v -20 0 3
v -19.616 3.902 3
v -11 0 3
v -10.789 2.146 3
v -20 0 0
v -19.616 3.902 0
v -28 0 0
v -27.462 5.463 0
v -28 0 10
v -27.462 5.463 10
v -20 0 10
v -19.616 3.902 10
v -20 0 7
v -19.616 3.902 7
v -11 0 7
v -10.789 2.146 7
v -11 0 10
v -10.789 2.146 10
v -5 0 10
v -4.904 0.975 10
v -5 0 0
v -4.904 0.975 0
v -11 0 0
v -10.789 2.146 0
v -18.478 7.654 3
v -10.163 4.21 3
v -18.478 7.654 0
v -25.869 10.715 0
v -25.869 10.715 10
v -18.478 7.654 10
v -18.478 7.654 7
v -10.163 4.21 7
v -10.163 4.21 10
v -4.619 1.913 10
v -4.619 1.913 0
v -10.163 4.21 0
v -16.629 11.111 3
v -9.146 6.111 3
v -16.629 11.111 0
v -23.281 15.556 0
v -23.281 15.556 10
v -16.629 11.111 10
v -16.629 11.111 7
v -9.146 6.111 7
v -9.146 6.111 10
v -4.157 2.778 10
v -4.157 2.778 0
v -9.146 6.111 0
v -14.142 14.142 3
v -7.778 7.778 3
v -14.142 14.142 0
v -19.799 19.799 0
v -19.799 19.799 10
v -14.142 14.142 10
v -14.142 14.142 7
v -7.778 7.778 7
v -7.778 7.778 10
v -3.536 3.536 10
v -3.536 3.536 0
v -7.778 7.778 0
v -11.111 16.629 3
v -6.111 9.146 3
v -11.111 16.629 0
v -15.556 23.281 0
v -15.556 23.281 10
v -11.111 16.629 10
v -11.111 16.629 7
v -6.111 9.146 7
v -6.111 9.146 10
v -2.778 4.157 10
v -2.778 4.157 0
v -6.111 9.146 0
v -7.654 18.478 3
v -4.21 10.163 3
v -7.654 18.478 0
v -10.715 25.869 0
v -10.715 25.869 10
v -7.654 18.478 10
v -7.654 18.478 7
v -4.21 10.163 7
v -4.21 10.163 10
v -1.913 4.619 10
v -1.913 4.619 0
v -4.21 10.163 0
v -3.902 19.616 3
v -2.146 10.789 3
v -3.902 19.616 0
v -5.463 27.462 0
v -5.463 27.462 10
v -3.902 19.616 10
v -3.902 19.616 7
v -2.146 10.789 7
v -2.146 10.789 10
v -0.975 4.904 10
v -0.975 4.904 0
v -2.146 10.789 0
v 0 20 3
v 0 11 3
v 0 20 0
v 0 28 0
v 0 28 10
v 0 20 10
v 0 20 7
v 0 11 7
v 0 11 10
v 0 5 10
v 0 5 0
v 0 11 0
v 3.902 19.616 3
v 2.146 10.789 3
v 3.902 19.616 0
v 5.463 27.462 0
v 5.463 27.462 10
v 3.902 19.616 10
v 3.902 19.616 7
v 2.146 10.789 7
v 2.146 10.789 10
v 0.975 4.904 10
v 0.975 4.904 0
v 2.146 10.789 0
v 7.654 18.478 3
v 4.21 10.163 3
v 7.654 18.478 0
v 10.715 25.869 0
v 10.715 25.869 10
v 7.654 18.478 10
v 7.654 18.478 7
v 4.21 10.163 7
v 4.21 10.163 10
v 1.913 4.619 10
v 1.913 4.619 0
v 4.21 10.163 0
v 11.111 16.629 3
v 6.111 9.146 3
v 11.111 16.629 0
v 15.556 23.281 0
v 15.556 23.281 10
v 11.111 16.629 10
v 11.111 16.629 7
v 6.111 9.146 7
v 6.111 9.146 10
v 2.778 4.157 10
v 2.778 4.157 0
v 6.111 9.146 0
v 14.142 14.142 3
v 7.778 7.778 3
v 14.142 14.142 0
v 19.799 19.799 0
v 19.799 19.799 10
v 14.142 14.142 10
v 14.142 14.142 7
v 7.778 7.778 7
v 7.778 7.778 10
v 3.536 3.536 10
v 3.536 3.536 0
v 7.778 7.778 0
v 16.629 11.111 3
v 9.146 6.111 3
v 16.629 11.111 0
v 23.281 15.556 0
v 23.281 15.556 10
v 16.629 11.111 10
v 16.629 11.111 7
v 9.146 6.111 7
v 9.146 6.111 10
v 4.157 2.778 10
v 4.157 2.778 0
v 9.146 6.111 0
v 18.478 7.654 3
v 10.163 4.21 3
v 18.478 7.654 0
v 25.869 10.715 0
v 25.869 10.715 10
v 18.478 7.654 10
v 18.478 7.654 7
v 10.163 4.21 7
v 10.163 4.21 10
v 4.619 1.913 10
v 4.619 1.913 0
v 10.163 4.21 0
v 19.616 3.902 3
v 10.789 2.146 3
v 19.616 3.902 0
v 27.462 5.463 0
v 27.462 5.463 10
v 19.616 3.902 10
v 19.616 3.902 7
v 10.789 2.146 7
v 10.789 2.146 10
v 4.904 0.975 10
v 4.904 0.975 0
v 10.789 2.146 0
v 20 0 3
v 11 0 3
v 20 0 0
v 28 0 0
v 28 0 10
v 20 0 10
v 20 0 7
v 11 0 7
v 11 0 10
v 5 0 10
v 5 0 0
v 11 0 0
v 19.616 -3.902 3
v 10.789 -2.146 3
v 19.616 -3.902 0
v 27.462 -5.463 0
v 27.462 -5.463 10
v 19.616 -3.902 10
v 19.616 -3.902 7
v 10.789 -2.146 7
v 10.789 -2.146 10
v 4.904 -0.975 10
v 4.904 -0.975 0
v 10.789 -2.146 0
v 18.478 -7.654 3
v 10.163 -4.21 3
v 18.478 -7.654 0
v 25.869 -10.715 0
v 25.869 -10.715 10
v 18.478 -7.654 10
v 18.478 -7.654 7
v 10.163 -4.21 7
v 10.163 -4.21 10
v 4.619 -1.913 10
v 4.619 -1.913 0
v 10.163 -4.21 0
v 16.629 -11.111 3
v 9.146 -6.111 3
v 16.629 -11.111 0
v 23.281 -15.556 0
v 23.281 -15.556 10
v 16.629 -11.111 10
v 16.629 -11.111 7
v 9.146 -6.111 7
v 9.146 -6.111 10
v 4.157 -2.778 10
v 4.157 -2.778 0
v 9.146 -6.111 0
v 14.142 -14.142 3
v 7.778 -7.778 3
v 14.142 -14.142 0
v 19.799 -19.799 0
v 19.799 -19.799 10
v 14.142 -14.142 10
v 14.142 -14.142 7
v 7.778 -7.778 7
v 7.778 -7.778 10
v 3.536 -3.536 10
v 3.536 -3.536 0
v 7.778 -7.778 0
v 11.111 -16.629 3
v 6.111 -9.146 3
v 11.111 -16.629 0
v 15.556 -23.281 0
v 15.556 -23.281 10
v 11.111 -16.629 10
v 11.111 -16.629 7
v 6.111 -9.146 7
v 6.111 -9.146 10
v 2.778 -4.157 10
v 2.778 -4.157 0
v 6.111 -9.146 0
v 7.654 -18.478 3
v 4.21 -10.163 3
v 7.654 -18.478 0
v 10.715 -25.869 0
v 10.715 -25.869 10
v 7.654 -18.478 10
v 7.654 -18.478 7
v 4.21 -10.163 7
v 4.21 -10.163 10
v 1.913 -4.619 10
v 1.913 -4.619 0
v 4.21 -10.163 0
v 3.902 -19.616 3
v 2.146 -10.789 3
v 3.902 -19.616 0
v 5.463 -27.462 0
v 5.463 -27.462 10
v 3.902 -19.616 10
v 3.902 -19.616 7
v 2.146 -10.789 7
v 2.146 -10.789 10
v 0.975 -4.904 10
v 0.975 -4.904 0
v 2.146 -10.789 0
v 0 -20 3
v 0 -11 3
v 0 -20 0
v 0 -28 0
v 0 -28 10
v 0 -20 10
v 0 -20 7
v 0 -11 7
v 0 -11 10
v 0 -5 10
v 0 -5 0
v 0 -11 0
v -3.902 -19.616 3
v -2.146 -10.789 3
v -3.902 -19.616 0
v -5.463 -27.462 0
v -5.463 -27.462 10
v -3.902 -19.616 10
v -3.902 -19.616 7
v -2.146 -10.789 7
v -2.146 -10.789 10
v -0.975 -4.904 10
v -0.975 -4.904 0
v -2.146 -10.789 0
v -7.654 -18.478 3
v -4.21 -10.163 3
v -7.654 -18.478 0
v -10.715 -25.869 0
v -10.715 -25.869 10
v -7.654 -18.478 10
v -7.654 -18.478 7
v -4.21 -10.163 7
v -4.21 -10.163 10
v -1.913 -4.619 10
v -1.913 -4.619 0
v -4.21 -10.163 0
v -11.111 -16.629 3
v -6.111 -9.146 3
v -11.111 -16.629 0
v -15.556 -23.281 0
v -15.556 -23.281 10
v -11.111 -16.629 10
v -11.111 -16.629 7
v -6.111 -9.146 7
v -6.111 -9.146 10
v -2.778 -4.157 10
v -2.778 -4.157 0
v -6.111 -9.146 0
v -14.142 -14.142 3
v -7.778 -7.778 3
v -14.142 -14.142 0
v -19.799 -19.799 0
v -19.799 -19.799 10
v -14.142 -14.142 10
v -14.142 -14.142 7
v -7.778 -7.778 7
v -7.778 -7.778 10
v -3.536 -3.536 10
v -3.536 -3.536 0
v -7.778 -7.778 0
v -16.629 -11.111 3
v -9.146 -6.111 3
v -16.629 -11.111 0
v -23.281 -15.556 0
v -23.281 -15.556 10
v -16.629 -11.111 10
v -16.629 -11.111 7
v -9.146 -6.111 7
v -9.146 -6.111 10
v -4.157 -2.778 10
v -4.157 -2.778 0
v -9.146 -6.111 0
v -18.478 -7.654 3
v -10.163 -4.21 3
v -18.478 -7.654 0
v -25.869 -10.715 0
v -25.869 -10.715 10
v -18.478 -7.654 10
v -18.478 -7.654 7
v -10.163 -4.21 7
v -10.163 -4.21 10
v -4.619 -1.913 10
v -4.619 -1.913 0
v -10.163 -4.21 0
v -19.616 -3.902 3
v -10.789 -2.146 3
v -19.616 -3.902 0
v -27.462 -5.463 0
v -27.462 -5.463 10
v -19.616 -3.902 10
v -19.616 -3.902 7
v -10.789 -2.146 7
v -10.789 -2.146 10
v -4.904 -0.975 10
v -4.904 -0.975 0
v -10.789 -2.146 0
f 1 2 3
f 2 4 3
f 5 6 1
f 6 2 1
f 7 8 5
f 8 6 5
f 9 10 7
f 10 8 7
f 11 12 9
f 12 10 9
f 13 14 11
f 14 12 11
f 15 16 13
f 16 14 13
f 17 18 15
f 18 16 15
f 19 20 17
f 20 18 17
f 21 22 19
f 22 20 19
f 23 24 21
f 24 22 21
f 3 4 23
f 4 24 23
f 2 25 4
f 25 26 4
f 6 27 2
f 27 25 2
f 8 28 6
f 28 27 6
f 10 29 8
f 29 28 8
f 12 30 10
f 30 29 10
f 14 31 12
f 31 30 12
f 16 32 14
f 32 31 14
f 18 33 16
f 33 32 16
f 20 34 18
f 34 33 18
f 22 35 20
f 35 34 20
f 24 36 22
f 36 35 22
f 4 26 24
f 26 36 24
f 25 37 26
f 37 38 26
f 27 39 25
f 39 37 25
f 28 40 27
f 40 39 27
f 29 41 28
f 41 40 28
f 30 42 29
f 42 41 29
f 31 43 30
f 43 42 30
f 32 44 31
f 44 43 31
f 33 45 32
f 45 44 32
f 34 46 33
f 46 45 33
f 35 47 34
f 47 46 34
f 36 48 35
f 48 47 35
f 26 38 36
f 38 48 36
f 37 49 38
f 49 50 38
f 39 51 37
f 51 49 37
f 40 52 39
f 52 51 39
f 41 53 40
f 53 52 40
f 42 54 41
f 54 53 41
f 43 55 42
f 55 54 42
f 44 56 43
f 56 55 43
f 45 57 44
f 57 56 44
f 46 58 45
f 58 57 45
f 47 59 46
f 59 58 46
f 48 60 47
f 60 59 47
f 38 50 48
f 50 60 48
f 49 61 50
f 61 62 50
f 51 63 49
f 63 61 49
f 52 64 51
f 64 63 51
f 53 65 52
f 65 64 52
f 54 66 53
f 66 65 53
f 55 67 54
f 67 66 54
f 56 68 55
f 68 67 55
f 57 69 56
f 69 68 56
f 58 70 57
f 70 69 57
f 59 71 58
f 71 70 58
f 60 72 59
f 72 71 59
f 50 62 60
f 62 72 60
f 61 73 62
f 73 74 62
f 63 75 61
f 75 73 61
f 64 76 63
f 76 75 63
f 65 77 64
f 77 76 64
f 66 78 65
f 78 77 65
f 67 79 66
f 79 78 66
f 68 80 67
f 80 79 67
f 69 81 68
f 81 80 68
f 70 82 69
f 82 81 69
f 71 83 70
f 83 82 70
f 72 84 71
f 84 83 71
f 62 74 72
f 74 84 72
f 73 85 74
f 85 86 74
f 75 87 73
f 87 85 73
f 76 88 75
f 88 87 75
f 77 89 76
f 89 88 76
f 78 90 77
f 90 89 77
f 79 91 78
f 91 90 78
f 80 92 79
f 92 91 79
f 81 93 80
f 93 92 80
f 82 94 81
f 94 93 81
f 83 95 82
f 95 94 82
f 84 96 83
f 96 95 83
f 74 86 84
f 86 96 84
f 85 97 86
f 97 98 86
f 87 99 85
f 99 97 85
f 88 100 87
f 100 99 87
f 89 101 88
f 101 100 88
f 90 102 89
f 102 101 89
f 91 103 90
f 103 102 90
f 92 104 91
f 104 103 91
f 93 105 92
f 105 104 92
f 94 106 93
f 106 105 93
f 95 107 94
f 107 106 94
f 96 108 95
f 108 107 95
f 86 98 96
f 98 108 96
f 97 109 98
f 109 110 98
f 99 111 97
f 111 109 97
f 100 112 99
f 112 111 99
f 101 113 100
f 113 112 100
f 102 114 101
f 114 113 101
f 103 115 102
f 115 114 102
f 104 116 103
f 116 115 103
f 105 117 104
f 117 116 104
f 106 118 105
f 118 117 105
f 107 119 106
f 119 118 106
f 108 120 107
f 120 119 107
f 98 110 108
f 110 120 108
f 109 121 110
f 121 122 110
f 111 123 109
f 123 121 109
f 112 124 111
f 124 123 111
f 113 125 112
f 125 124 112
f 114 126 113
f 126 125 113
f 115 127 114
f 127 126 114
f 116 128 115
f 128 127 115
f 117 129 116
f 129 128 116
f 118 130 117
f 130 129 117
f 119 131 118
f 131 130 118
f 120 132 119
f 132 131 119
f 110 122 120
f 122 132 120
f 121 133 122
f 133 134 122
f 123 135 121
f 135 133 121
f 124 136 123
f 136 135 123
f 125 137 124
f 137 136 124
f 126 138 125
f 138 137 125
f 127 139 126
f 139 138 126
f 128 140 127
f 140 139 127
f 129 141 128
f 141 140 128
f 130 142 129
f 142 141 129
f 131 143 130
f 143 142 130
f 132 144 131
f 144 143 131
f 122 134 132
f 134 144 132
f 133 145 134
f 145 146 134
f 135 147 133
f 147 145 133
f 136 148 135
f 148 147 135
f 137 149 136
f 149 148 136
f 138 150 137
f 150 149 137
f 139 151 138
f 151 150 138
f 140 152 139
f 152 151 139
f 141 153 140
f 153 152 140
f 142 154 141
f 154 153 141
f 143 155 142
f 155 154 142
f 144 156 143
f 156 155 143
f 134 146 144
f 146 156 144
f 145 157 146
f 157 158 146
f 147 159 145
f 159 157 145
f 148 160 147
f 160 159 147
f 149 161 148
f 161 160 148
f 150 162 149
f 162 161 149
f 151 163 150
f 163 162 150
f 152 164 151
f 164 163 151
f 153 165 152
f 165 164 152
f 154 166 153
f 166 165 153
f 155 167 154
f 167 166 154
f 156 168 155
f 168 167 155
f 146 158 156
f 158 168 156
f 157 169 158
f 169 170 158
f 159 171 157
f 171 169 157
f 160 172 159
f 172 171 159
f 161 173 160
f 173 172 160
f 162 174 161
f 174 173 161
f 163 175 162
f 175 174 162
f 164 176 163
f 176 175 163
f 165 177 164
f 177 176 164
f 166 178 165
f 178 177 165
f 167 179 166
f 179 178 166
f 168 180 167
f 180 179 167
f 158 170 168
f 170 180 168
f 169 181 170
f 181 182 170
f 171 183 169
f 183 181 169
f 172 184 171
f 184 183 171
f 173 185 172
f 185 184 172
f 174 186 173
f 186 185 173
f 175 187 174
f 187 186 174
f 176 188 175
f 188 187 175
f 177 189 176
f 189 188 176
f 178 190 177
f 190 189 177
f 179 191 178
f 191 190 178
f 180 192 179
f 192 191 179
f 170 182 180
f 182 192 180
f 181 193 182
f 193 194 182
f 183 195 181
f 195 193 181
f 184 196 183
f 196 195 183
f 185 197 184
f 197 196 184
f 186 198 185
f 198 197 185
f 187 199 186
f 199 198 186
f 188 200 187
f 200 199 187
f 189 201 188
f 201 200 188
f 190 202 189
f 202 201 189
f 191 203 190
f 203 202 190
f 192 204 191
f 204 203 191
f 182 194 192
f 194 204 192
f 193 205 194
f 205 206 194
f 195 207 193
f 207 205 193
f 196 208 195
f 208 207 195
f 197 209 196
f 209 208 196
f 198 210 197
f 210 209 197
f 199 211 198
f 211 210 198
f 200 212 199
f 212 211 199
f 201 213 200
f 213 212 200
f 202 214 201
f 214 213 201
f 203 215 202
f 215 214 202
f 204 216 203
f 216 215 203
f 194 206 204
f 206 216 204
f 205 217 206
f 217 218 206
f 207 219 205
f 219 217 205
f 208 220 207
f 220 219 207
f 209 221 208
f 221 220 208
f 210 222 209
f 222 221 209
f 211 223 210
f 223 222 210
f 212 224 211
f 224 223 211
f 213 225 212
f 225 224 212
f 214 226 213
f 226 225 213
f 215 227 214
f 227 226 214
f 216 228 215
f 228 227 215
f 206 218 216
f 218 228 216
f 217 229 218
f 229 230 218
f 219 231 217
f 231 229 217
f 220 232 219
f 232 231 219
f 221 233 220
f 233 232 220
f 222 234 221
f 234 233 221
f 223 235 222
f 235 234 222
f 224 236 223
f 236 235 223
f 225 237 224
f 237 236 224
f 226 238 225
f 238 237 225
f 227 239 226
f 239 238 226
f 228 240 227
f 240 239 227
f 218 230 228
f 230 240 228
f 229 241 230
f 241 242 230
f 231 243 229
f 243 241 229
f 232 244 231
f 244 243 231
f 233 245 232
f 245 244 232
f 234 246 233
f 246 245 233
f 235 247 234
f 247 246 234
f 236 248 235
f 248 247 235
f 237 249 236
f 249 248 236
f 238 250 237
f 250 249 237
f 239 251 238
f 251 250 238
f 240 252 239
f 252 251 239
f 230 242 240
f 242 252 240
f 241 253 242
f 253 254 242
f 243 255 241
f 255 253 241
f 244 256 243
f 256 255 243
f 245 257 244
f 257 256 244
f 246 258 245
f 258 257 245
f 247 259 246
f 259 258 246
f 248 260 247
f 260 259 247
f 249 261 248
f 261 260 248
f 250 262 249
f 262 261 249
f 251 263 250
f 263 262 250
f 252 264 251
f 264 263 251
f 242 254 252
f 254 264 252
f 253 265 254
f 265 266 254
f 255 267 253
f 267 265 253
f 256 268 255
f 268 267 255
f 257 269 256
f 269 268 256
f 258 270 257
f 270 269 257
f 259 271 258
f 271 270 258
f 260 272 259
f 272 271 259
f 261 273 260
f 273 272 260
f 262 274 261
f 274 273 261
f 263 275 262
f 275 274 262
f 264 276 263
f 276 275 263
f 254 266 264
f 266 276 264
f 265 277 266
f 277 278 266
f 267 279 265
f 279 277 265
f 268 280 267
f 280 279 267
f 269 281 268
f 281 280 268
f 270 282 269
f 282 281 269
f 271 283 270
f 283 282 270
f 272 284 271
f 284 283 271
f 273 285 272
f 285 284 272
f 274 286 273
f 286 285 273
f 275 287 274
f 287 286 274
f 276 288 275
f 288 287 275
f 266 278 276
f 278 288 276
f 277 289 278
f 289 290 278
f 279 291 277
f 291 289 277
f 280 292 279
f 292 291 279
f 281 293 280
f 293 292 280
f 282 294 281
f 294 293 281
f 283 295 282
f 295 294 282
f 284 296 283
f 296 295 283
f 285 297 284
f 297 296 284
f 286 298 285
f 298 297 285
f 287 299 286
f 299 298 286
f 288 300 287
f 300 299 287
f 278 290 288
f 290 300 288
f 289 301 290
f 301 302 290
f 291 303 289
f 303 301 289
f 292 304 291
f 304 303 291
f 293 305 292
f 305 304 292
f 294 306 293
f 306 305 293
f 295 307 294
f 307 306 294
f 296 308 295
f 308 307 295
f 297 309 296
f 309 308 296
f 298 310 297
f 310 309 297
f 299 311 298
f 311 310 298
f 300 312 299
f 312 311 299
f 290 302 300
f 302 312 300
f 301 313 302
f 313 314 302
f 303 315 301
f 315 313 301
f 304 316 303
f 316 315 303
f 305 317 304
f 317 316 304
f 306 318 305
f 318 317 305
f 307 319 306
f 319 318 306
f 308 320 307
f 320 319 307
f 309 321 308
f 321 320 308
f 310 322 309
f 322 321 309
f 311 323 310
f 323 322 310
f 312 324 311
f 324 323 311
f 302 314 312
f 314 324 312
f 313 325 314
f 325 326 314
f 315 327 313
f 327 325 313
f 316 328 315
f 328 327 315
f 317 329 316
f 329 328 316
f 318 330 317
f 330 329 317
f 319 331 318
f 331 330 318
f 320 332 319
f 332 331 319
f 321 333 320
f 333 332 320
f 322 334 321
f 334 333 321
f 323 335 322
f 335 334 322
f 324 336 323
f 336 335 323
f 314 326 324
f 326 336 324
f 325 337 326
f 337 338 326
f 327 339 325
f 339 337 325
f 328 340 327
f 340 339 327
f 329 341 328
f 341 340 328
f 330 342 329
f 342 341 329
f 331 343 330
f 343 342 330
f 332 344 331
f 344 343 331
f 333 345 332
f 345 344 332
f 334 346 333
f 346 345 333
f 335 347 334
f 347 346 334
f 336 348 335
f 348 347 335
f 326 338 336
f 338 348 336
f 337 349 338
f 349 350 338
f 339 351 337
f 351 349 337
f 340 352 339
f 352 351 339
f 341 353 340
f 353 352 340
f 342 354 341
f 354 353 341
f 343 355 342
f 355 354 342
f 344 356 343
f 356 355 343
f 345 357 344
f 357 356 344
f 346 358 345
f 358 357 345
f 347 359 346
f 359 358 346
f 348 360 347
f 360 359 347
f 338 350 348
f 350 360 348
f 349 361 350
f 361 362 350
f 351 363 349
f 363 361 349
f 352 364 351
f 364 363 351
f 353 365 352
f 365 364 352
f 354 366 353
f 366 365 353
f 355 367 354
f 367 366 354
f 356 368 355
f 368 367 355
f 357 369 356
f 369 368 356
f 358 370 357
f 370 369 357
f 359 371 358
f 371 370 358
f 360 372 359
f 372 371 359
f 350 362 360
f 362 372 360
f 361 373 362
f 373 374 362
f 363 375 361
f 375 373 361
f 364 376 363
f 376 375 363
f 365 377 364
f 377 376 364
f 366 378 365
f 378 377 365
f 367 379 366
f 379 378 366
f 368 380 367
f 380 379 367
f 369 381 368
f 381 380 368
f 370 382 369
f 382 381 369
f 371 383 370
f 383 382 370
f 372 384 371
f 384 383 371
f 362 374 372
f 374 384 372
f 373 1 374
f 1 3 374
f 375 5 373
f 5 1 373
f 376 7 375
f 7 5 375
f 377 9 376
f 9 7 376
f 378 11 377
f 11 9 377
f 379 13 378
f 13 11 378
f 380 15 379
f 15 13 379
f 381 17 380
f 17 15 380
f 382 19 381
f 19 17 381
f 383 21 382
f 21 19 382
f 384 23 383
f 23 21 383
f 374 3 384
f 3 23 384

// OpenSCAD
$fn = 32;

// ----------------------------------------------------------------------
// Revolved part: handwheel R28
// ----------------------------------------------------------------------

// --- parameters (mm) ---
bore_r = 5;               // bore radius
rim_r = 28;               // rim radius
rim_w = 8;                // rim axial width
rim_t = 10;               // rim diameter height
hub_r = 11;               // hub radius
web_t = 4;                // web thickness
revolve_angle = 360;      // revolve sweep, degrees

bore_d = 2 * bore_r;
rim_d = 2 * rim_r;
hub_d = 2 * hub_r;

profile = [[5, 0], [11, 0], [11, 3], [20, 3], [20, 0], [28, 0], [28, 10], [20, 10], [20, 7], [11, 7], [11, 10], [5, 10]];  // primary outline, 12 points, counter clockwise

// --- the one profile operation ---
rotate_extrude(angle = revolve_angle) polygon(points = profile);
